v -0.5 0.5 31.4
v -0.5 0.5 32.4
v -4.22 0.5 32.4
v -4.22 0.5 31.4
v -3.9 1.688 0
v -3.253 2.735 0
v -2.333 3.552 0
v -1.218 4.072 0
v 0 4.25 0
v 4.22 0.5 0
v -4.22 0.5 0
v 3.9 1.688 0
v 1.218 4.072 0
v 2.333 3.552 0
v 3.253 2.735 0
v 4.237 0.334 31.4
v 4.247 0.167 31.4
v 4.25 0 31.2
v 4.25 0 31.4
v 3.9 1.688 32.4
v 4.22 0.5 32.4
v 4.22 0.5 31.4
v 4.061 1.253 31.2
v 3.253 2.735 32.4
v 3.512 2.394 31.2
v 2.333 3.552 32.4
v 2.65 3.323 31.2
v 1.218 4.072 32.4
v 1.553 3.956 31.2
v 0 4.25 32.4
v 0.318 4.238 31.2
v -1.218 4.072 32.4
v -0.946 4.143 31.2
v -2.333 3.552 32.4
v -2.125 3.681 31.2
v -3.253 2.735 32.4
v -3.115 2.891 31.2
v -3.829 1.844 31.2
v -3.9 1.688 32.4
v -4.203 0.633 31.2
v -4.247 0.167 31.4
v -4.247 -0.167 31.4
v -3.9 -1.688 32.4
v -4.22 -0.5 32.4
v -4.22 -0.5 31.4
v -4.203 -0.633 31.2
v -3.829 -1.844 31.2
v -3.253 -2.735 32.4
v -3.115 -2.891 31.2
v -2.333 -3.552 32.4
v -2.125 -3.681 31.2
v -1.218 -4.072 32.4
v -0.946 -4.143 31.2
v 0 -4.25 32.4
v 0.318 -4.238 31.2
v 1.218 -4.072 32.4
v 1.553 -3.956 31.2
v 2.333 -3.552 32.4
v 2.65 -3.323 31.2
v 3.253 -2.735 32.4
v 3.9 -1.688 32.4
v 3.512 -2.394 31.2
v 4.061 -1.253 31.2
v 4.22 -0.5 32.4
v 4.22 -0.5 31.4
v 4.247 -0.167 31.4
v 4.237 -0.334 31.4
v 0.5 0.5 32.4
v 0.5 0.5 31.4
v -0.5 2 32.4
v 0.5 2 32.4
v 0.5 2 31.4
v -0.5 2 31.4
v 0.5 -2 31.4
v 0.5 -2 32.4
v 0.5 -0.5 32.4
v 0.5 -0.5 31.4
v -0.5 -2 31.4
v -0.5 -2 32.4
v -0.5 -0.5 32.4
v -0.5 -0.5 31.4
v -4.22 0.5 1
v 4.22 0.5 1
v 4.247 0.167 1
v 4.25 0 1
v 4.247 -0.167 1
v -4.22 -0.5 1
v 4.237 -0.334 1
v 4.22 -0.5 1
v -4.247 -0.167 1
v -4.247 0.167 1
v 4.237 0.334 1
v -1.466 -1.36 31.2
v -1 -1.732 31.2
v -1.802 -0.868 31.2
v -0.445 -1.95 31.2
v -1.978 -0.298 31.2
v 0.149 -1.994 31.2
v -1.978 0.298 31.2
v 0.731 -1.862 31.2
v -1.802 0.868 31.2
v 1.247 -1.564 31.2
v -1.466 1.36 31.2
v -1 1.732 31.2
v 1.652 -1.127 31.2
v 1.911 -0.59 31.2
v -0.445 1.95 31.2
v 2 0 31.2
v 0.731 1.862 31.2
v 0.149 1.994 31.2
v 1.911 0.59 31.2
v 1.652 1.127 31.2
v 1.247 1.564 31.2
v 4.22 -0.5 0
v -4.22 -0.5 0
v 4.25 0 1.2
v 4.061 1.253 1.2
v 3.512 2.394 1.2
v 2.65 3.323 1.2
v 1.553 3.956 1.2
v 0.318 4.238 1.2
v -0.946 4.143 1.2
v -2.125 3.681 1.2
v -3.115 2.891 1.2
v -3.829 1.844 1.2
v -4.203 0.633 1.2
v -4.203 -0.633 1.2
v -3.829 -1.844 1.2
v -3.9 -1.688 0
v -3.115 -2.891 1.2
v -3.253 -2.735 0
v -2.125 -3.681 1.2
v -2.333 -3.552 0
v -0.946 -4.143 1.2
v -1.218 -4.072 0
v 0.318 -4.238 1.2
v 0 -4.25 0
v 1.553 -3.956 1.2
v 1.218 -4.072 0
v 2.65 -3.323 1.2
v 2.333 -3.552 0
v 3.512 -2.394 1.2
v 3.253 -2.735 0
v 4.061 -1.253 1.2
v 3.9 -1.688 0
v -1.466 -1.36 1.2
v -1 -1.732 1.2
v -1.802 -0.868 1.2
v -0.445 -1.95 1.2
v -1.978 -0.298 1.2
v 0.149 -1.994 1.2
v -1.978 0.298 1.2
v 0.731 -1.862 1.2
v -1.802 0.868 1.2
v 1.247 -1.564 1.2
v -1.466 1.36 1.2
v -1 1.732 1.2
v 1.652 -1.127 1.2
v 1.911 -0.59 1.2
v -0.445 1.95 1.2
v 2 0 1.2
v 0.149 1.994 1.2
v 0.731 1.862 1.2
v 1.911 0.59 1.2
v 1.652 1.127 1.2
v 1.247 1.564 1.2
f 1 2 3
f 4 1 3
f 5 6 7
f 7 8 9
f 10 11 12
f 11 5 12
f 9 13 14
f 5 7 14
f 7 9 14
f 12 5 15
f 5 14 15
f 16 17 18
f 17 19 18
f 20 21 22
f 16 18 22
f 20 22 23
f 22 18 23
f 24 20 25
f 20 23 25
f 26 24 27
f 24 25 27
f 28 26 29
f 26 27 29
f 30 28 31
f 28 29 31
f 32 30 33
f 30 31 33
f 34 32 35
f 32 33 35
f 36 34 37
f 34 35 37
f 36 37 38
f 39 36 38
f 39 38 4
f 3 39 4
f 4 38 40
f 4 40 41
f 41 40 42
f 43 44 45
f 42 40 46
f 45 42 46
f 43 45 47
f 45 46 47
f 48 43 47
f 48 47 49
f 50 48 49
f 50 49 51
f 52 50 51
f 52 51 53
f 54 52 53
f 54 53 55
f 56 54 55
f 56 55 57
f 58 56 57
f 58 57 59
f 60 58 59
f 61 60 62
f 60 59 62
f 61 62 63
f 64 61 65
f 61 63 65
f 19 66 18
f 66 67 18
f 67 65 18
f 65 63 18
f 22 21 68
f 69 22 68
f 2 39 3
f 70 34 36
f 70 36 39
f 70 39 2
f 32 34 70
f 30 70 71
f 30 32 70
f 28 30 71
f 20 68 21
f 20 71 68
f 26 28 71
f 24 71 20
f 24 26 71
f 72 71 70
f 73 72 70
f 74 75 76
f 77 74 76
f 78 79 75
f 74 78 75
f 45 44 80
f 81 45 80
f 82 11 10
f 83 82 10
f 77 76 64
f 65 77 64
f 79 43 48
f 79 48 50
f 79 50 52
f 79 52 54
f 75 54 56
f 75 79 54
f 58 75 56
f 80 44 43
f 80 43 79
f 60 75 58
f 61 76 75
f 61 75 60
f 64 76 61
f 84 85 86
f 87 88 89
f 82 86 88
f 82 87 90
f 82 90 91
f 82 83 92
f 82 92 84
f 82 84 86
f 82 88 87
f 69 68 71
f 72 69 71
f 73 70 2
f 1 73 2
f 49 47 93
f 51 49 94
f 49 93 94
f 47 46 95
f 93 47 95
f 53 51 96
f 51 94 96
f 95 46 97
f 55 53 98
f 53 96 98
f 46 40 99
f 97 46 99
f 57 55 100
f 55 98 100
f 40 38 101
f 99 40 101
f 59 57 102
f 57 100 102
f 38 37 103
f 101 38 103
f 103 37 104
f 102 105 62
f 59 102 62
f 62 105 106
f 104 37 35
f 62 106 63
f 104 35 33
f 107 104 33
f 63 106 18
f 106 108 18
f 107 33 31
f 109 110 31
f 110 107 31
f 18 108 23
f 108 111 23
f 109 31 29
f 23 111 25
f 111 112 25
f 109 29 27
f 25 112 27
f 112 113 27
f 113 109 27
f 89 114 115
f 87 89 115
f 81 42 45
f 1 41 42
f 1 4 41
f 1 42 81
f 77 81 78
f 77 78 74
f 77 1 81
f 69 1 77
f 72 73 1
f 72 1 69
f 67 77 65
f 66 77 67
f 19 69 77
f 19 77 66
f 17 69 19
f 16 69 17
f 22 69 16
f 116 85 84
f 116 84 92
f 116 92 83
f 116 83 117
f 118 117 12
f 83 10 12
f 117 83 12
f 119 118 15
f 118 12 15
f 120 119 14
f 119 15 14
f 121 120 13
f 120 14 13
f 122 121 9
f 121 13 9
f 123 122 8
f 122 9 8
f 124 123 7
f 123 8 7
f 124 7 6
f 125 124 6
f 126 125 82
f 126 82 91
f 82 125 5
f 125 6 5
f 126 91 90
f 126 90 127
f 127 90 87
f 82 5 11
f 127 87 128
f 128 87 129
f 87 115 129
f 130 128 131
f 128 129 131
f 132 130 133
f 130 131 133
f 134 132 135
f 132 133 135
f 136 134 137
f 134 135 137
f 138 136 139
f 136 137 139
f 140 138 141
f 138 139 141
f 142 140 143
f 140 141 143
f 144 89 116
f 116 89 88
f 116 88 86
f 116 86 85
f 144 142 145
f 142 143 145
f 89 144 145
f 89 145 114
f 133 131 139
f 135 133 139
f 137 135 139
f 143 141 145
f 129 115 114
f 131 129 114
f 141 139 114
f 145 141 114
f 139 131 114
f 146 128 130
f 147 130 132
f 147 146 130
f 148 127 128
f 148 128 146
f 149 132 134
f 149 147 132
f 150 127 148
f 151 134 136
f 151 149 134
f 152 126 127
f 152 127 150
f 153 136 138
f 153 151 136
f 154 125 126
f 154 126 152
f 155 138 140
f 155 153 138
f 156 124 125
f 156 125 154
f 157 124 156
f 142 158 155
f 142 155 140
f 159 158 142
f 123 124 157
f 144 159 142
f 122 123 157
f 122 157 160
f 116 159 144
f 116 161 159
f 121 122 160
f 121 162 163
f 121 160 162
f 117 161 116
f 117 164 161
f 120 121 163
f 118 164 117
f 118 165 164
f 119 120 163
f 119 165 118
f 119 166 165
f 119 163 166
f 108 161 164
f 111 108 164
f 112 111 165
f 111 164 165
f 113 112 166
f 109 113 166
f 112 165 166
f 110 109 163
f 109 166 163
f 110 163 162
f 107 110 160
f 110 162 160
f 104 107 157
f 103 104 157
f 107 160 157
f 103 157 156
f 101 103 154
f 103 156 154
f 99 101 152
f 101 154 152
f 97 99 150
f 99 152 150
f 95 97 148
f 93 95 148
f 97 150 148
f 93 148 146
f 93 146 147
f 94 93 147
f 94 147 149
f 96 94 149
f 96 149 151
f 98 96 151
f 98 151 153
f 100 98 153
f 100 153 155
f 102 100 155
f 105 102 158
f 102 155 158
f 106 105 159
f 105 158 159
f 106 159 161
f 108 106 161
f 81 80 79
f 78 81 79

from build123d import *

# Parameters (mm, degrees)
SKETCH_1_R          = 4.25
EXTRUDE_1_DEPTH     = 1.2
SKETCH_2_R          = 2
EXTRUDE_2_DEPTH     = 30
SKETCH_3_R          = 4.25
EXTRUDE_3_DEPTH     = 1.2
CUT_EXTRUDE_1_DEPTH = 1
CUT_EXTRUDE_2_DEPTH = 1


with BuildPart() as part:
    # 草图1 → 凸台-拉伸1 (new body)
    with BuildSketch(Plane.XY):
        Circle(SKETCH_1_R)
    extrude(amount=EXTRUDE_1_DEPTH)

    # 草图2 → 凸台-拉伸2 (add)
    with BuildSketch(Plane.XY.offset(1.2)):
        Circle(SKETCH_2_R)
    extrude(amount=EXTRUDE_2_DEPTH)

    # 草图3 → 凸台-拉伸3 (add)
    with BuildSketch(Plane.XY.offset(31.2)):
        Circle(SKETCH_3_R)
    extrude(amount=EXTRUDE_3_DEPTH)

    # 草图4 → 切除-拉伸1 (cut)
    with BuildSketch(Plane.XY.offset(32.4)):
        with BuildLine():
            Line((-0.5, 2), (-0.5, 0.5))
            Line((-0.5, 0.5), (-4.723610907, 0.5))
            ThreePointArc((-4.723610907, 0.5), (-4.75, 0), (-4.723610907, -0.5))
            Line((-4.723610907, -0.5), (-0.5, -0.5))
            Line((-0.5, -0.5), (-0.5, -2))
            Line((-0.5, -2), (0.5, -2))
            Line((0.5, -2), (0.5, -0.5))
            Line((0.5, -0.5), (4.723610907, -0.5))
            ThreePointArc((4.723610907, -0.5), (4.75, 0), (4.723610907, 0.5))
            Line((4.723610907, 0.5), (0.5, 0.5))
            Line((0.5, 0.5), (0.5, 2))
            Line((0.5, 2), (-0.5, 2))
        make_face()
    extrude(amount=-CUT_EXTRUDE_1_DEPTH, mode=Mode.SUBTRACT)

    # 草图5 → 切除-拉伸2 (cut)
    with BuildSketch(Plane(origin=(0, 0, 0), x_dir=(-1, 0, 0), z_dir=(0, 0, -1))):
        with BuildLine():
            Line((-4.723610907, -0.5), (4.723610907, -0.5))
            ThreePointArc((4.723610907, -0.5), (4.75, 0), (4.723610907, 0.5))
            Line((4.723610907, 0.5), (-4.723610907, 0.5))
            ThreePointArc((-4.723610907, 0.5), (-4.75, 0), (-4.723610907, -0.5))
        make_face()
    extrude(amount=-CUT_EXTRUDE_2_DEPTH, mode=Mode.SUBTRACT)


solid = part.part
